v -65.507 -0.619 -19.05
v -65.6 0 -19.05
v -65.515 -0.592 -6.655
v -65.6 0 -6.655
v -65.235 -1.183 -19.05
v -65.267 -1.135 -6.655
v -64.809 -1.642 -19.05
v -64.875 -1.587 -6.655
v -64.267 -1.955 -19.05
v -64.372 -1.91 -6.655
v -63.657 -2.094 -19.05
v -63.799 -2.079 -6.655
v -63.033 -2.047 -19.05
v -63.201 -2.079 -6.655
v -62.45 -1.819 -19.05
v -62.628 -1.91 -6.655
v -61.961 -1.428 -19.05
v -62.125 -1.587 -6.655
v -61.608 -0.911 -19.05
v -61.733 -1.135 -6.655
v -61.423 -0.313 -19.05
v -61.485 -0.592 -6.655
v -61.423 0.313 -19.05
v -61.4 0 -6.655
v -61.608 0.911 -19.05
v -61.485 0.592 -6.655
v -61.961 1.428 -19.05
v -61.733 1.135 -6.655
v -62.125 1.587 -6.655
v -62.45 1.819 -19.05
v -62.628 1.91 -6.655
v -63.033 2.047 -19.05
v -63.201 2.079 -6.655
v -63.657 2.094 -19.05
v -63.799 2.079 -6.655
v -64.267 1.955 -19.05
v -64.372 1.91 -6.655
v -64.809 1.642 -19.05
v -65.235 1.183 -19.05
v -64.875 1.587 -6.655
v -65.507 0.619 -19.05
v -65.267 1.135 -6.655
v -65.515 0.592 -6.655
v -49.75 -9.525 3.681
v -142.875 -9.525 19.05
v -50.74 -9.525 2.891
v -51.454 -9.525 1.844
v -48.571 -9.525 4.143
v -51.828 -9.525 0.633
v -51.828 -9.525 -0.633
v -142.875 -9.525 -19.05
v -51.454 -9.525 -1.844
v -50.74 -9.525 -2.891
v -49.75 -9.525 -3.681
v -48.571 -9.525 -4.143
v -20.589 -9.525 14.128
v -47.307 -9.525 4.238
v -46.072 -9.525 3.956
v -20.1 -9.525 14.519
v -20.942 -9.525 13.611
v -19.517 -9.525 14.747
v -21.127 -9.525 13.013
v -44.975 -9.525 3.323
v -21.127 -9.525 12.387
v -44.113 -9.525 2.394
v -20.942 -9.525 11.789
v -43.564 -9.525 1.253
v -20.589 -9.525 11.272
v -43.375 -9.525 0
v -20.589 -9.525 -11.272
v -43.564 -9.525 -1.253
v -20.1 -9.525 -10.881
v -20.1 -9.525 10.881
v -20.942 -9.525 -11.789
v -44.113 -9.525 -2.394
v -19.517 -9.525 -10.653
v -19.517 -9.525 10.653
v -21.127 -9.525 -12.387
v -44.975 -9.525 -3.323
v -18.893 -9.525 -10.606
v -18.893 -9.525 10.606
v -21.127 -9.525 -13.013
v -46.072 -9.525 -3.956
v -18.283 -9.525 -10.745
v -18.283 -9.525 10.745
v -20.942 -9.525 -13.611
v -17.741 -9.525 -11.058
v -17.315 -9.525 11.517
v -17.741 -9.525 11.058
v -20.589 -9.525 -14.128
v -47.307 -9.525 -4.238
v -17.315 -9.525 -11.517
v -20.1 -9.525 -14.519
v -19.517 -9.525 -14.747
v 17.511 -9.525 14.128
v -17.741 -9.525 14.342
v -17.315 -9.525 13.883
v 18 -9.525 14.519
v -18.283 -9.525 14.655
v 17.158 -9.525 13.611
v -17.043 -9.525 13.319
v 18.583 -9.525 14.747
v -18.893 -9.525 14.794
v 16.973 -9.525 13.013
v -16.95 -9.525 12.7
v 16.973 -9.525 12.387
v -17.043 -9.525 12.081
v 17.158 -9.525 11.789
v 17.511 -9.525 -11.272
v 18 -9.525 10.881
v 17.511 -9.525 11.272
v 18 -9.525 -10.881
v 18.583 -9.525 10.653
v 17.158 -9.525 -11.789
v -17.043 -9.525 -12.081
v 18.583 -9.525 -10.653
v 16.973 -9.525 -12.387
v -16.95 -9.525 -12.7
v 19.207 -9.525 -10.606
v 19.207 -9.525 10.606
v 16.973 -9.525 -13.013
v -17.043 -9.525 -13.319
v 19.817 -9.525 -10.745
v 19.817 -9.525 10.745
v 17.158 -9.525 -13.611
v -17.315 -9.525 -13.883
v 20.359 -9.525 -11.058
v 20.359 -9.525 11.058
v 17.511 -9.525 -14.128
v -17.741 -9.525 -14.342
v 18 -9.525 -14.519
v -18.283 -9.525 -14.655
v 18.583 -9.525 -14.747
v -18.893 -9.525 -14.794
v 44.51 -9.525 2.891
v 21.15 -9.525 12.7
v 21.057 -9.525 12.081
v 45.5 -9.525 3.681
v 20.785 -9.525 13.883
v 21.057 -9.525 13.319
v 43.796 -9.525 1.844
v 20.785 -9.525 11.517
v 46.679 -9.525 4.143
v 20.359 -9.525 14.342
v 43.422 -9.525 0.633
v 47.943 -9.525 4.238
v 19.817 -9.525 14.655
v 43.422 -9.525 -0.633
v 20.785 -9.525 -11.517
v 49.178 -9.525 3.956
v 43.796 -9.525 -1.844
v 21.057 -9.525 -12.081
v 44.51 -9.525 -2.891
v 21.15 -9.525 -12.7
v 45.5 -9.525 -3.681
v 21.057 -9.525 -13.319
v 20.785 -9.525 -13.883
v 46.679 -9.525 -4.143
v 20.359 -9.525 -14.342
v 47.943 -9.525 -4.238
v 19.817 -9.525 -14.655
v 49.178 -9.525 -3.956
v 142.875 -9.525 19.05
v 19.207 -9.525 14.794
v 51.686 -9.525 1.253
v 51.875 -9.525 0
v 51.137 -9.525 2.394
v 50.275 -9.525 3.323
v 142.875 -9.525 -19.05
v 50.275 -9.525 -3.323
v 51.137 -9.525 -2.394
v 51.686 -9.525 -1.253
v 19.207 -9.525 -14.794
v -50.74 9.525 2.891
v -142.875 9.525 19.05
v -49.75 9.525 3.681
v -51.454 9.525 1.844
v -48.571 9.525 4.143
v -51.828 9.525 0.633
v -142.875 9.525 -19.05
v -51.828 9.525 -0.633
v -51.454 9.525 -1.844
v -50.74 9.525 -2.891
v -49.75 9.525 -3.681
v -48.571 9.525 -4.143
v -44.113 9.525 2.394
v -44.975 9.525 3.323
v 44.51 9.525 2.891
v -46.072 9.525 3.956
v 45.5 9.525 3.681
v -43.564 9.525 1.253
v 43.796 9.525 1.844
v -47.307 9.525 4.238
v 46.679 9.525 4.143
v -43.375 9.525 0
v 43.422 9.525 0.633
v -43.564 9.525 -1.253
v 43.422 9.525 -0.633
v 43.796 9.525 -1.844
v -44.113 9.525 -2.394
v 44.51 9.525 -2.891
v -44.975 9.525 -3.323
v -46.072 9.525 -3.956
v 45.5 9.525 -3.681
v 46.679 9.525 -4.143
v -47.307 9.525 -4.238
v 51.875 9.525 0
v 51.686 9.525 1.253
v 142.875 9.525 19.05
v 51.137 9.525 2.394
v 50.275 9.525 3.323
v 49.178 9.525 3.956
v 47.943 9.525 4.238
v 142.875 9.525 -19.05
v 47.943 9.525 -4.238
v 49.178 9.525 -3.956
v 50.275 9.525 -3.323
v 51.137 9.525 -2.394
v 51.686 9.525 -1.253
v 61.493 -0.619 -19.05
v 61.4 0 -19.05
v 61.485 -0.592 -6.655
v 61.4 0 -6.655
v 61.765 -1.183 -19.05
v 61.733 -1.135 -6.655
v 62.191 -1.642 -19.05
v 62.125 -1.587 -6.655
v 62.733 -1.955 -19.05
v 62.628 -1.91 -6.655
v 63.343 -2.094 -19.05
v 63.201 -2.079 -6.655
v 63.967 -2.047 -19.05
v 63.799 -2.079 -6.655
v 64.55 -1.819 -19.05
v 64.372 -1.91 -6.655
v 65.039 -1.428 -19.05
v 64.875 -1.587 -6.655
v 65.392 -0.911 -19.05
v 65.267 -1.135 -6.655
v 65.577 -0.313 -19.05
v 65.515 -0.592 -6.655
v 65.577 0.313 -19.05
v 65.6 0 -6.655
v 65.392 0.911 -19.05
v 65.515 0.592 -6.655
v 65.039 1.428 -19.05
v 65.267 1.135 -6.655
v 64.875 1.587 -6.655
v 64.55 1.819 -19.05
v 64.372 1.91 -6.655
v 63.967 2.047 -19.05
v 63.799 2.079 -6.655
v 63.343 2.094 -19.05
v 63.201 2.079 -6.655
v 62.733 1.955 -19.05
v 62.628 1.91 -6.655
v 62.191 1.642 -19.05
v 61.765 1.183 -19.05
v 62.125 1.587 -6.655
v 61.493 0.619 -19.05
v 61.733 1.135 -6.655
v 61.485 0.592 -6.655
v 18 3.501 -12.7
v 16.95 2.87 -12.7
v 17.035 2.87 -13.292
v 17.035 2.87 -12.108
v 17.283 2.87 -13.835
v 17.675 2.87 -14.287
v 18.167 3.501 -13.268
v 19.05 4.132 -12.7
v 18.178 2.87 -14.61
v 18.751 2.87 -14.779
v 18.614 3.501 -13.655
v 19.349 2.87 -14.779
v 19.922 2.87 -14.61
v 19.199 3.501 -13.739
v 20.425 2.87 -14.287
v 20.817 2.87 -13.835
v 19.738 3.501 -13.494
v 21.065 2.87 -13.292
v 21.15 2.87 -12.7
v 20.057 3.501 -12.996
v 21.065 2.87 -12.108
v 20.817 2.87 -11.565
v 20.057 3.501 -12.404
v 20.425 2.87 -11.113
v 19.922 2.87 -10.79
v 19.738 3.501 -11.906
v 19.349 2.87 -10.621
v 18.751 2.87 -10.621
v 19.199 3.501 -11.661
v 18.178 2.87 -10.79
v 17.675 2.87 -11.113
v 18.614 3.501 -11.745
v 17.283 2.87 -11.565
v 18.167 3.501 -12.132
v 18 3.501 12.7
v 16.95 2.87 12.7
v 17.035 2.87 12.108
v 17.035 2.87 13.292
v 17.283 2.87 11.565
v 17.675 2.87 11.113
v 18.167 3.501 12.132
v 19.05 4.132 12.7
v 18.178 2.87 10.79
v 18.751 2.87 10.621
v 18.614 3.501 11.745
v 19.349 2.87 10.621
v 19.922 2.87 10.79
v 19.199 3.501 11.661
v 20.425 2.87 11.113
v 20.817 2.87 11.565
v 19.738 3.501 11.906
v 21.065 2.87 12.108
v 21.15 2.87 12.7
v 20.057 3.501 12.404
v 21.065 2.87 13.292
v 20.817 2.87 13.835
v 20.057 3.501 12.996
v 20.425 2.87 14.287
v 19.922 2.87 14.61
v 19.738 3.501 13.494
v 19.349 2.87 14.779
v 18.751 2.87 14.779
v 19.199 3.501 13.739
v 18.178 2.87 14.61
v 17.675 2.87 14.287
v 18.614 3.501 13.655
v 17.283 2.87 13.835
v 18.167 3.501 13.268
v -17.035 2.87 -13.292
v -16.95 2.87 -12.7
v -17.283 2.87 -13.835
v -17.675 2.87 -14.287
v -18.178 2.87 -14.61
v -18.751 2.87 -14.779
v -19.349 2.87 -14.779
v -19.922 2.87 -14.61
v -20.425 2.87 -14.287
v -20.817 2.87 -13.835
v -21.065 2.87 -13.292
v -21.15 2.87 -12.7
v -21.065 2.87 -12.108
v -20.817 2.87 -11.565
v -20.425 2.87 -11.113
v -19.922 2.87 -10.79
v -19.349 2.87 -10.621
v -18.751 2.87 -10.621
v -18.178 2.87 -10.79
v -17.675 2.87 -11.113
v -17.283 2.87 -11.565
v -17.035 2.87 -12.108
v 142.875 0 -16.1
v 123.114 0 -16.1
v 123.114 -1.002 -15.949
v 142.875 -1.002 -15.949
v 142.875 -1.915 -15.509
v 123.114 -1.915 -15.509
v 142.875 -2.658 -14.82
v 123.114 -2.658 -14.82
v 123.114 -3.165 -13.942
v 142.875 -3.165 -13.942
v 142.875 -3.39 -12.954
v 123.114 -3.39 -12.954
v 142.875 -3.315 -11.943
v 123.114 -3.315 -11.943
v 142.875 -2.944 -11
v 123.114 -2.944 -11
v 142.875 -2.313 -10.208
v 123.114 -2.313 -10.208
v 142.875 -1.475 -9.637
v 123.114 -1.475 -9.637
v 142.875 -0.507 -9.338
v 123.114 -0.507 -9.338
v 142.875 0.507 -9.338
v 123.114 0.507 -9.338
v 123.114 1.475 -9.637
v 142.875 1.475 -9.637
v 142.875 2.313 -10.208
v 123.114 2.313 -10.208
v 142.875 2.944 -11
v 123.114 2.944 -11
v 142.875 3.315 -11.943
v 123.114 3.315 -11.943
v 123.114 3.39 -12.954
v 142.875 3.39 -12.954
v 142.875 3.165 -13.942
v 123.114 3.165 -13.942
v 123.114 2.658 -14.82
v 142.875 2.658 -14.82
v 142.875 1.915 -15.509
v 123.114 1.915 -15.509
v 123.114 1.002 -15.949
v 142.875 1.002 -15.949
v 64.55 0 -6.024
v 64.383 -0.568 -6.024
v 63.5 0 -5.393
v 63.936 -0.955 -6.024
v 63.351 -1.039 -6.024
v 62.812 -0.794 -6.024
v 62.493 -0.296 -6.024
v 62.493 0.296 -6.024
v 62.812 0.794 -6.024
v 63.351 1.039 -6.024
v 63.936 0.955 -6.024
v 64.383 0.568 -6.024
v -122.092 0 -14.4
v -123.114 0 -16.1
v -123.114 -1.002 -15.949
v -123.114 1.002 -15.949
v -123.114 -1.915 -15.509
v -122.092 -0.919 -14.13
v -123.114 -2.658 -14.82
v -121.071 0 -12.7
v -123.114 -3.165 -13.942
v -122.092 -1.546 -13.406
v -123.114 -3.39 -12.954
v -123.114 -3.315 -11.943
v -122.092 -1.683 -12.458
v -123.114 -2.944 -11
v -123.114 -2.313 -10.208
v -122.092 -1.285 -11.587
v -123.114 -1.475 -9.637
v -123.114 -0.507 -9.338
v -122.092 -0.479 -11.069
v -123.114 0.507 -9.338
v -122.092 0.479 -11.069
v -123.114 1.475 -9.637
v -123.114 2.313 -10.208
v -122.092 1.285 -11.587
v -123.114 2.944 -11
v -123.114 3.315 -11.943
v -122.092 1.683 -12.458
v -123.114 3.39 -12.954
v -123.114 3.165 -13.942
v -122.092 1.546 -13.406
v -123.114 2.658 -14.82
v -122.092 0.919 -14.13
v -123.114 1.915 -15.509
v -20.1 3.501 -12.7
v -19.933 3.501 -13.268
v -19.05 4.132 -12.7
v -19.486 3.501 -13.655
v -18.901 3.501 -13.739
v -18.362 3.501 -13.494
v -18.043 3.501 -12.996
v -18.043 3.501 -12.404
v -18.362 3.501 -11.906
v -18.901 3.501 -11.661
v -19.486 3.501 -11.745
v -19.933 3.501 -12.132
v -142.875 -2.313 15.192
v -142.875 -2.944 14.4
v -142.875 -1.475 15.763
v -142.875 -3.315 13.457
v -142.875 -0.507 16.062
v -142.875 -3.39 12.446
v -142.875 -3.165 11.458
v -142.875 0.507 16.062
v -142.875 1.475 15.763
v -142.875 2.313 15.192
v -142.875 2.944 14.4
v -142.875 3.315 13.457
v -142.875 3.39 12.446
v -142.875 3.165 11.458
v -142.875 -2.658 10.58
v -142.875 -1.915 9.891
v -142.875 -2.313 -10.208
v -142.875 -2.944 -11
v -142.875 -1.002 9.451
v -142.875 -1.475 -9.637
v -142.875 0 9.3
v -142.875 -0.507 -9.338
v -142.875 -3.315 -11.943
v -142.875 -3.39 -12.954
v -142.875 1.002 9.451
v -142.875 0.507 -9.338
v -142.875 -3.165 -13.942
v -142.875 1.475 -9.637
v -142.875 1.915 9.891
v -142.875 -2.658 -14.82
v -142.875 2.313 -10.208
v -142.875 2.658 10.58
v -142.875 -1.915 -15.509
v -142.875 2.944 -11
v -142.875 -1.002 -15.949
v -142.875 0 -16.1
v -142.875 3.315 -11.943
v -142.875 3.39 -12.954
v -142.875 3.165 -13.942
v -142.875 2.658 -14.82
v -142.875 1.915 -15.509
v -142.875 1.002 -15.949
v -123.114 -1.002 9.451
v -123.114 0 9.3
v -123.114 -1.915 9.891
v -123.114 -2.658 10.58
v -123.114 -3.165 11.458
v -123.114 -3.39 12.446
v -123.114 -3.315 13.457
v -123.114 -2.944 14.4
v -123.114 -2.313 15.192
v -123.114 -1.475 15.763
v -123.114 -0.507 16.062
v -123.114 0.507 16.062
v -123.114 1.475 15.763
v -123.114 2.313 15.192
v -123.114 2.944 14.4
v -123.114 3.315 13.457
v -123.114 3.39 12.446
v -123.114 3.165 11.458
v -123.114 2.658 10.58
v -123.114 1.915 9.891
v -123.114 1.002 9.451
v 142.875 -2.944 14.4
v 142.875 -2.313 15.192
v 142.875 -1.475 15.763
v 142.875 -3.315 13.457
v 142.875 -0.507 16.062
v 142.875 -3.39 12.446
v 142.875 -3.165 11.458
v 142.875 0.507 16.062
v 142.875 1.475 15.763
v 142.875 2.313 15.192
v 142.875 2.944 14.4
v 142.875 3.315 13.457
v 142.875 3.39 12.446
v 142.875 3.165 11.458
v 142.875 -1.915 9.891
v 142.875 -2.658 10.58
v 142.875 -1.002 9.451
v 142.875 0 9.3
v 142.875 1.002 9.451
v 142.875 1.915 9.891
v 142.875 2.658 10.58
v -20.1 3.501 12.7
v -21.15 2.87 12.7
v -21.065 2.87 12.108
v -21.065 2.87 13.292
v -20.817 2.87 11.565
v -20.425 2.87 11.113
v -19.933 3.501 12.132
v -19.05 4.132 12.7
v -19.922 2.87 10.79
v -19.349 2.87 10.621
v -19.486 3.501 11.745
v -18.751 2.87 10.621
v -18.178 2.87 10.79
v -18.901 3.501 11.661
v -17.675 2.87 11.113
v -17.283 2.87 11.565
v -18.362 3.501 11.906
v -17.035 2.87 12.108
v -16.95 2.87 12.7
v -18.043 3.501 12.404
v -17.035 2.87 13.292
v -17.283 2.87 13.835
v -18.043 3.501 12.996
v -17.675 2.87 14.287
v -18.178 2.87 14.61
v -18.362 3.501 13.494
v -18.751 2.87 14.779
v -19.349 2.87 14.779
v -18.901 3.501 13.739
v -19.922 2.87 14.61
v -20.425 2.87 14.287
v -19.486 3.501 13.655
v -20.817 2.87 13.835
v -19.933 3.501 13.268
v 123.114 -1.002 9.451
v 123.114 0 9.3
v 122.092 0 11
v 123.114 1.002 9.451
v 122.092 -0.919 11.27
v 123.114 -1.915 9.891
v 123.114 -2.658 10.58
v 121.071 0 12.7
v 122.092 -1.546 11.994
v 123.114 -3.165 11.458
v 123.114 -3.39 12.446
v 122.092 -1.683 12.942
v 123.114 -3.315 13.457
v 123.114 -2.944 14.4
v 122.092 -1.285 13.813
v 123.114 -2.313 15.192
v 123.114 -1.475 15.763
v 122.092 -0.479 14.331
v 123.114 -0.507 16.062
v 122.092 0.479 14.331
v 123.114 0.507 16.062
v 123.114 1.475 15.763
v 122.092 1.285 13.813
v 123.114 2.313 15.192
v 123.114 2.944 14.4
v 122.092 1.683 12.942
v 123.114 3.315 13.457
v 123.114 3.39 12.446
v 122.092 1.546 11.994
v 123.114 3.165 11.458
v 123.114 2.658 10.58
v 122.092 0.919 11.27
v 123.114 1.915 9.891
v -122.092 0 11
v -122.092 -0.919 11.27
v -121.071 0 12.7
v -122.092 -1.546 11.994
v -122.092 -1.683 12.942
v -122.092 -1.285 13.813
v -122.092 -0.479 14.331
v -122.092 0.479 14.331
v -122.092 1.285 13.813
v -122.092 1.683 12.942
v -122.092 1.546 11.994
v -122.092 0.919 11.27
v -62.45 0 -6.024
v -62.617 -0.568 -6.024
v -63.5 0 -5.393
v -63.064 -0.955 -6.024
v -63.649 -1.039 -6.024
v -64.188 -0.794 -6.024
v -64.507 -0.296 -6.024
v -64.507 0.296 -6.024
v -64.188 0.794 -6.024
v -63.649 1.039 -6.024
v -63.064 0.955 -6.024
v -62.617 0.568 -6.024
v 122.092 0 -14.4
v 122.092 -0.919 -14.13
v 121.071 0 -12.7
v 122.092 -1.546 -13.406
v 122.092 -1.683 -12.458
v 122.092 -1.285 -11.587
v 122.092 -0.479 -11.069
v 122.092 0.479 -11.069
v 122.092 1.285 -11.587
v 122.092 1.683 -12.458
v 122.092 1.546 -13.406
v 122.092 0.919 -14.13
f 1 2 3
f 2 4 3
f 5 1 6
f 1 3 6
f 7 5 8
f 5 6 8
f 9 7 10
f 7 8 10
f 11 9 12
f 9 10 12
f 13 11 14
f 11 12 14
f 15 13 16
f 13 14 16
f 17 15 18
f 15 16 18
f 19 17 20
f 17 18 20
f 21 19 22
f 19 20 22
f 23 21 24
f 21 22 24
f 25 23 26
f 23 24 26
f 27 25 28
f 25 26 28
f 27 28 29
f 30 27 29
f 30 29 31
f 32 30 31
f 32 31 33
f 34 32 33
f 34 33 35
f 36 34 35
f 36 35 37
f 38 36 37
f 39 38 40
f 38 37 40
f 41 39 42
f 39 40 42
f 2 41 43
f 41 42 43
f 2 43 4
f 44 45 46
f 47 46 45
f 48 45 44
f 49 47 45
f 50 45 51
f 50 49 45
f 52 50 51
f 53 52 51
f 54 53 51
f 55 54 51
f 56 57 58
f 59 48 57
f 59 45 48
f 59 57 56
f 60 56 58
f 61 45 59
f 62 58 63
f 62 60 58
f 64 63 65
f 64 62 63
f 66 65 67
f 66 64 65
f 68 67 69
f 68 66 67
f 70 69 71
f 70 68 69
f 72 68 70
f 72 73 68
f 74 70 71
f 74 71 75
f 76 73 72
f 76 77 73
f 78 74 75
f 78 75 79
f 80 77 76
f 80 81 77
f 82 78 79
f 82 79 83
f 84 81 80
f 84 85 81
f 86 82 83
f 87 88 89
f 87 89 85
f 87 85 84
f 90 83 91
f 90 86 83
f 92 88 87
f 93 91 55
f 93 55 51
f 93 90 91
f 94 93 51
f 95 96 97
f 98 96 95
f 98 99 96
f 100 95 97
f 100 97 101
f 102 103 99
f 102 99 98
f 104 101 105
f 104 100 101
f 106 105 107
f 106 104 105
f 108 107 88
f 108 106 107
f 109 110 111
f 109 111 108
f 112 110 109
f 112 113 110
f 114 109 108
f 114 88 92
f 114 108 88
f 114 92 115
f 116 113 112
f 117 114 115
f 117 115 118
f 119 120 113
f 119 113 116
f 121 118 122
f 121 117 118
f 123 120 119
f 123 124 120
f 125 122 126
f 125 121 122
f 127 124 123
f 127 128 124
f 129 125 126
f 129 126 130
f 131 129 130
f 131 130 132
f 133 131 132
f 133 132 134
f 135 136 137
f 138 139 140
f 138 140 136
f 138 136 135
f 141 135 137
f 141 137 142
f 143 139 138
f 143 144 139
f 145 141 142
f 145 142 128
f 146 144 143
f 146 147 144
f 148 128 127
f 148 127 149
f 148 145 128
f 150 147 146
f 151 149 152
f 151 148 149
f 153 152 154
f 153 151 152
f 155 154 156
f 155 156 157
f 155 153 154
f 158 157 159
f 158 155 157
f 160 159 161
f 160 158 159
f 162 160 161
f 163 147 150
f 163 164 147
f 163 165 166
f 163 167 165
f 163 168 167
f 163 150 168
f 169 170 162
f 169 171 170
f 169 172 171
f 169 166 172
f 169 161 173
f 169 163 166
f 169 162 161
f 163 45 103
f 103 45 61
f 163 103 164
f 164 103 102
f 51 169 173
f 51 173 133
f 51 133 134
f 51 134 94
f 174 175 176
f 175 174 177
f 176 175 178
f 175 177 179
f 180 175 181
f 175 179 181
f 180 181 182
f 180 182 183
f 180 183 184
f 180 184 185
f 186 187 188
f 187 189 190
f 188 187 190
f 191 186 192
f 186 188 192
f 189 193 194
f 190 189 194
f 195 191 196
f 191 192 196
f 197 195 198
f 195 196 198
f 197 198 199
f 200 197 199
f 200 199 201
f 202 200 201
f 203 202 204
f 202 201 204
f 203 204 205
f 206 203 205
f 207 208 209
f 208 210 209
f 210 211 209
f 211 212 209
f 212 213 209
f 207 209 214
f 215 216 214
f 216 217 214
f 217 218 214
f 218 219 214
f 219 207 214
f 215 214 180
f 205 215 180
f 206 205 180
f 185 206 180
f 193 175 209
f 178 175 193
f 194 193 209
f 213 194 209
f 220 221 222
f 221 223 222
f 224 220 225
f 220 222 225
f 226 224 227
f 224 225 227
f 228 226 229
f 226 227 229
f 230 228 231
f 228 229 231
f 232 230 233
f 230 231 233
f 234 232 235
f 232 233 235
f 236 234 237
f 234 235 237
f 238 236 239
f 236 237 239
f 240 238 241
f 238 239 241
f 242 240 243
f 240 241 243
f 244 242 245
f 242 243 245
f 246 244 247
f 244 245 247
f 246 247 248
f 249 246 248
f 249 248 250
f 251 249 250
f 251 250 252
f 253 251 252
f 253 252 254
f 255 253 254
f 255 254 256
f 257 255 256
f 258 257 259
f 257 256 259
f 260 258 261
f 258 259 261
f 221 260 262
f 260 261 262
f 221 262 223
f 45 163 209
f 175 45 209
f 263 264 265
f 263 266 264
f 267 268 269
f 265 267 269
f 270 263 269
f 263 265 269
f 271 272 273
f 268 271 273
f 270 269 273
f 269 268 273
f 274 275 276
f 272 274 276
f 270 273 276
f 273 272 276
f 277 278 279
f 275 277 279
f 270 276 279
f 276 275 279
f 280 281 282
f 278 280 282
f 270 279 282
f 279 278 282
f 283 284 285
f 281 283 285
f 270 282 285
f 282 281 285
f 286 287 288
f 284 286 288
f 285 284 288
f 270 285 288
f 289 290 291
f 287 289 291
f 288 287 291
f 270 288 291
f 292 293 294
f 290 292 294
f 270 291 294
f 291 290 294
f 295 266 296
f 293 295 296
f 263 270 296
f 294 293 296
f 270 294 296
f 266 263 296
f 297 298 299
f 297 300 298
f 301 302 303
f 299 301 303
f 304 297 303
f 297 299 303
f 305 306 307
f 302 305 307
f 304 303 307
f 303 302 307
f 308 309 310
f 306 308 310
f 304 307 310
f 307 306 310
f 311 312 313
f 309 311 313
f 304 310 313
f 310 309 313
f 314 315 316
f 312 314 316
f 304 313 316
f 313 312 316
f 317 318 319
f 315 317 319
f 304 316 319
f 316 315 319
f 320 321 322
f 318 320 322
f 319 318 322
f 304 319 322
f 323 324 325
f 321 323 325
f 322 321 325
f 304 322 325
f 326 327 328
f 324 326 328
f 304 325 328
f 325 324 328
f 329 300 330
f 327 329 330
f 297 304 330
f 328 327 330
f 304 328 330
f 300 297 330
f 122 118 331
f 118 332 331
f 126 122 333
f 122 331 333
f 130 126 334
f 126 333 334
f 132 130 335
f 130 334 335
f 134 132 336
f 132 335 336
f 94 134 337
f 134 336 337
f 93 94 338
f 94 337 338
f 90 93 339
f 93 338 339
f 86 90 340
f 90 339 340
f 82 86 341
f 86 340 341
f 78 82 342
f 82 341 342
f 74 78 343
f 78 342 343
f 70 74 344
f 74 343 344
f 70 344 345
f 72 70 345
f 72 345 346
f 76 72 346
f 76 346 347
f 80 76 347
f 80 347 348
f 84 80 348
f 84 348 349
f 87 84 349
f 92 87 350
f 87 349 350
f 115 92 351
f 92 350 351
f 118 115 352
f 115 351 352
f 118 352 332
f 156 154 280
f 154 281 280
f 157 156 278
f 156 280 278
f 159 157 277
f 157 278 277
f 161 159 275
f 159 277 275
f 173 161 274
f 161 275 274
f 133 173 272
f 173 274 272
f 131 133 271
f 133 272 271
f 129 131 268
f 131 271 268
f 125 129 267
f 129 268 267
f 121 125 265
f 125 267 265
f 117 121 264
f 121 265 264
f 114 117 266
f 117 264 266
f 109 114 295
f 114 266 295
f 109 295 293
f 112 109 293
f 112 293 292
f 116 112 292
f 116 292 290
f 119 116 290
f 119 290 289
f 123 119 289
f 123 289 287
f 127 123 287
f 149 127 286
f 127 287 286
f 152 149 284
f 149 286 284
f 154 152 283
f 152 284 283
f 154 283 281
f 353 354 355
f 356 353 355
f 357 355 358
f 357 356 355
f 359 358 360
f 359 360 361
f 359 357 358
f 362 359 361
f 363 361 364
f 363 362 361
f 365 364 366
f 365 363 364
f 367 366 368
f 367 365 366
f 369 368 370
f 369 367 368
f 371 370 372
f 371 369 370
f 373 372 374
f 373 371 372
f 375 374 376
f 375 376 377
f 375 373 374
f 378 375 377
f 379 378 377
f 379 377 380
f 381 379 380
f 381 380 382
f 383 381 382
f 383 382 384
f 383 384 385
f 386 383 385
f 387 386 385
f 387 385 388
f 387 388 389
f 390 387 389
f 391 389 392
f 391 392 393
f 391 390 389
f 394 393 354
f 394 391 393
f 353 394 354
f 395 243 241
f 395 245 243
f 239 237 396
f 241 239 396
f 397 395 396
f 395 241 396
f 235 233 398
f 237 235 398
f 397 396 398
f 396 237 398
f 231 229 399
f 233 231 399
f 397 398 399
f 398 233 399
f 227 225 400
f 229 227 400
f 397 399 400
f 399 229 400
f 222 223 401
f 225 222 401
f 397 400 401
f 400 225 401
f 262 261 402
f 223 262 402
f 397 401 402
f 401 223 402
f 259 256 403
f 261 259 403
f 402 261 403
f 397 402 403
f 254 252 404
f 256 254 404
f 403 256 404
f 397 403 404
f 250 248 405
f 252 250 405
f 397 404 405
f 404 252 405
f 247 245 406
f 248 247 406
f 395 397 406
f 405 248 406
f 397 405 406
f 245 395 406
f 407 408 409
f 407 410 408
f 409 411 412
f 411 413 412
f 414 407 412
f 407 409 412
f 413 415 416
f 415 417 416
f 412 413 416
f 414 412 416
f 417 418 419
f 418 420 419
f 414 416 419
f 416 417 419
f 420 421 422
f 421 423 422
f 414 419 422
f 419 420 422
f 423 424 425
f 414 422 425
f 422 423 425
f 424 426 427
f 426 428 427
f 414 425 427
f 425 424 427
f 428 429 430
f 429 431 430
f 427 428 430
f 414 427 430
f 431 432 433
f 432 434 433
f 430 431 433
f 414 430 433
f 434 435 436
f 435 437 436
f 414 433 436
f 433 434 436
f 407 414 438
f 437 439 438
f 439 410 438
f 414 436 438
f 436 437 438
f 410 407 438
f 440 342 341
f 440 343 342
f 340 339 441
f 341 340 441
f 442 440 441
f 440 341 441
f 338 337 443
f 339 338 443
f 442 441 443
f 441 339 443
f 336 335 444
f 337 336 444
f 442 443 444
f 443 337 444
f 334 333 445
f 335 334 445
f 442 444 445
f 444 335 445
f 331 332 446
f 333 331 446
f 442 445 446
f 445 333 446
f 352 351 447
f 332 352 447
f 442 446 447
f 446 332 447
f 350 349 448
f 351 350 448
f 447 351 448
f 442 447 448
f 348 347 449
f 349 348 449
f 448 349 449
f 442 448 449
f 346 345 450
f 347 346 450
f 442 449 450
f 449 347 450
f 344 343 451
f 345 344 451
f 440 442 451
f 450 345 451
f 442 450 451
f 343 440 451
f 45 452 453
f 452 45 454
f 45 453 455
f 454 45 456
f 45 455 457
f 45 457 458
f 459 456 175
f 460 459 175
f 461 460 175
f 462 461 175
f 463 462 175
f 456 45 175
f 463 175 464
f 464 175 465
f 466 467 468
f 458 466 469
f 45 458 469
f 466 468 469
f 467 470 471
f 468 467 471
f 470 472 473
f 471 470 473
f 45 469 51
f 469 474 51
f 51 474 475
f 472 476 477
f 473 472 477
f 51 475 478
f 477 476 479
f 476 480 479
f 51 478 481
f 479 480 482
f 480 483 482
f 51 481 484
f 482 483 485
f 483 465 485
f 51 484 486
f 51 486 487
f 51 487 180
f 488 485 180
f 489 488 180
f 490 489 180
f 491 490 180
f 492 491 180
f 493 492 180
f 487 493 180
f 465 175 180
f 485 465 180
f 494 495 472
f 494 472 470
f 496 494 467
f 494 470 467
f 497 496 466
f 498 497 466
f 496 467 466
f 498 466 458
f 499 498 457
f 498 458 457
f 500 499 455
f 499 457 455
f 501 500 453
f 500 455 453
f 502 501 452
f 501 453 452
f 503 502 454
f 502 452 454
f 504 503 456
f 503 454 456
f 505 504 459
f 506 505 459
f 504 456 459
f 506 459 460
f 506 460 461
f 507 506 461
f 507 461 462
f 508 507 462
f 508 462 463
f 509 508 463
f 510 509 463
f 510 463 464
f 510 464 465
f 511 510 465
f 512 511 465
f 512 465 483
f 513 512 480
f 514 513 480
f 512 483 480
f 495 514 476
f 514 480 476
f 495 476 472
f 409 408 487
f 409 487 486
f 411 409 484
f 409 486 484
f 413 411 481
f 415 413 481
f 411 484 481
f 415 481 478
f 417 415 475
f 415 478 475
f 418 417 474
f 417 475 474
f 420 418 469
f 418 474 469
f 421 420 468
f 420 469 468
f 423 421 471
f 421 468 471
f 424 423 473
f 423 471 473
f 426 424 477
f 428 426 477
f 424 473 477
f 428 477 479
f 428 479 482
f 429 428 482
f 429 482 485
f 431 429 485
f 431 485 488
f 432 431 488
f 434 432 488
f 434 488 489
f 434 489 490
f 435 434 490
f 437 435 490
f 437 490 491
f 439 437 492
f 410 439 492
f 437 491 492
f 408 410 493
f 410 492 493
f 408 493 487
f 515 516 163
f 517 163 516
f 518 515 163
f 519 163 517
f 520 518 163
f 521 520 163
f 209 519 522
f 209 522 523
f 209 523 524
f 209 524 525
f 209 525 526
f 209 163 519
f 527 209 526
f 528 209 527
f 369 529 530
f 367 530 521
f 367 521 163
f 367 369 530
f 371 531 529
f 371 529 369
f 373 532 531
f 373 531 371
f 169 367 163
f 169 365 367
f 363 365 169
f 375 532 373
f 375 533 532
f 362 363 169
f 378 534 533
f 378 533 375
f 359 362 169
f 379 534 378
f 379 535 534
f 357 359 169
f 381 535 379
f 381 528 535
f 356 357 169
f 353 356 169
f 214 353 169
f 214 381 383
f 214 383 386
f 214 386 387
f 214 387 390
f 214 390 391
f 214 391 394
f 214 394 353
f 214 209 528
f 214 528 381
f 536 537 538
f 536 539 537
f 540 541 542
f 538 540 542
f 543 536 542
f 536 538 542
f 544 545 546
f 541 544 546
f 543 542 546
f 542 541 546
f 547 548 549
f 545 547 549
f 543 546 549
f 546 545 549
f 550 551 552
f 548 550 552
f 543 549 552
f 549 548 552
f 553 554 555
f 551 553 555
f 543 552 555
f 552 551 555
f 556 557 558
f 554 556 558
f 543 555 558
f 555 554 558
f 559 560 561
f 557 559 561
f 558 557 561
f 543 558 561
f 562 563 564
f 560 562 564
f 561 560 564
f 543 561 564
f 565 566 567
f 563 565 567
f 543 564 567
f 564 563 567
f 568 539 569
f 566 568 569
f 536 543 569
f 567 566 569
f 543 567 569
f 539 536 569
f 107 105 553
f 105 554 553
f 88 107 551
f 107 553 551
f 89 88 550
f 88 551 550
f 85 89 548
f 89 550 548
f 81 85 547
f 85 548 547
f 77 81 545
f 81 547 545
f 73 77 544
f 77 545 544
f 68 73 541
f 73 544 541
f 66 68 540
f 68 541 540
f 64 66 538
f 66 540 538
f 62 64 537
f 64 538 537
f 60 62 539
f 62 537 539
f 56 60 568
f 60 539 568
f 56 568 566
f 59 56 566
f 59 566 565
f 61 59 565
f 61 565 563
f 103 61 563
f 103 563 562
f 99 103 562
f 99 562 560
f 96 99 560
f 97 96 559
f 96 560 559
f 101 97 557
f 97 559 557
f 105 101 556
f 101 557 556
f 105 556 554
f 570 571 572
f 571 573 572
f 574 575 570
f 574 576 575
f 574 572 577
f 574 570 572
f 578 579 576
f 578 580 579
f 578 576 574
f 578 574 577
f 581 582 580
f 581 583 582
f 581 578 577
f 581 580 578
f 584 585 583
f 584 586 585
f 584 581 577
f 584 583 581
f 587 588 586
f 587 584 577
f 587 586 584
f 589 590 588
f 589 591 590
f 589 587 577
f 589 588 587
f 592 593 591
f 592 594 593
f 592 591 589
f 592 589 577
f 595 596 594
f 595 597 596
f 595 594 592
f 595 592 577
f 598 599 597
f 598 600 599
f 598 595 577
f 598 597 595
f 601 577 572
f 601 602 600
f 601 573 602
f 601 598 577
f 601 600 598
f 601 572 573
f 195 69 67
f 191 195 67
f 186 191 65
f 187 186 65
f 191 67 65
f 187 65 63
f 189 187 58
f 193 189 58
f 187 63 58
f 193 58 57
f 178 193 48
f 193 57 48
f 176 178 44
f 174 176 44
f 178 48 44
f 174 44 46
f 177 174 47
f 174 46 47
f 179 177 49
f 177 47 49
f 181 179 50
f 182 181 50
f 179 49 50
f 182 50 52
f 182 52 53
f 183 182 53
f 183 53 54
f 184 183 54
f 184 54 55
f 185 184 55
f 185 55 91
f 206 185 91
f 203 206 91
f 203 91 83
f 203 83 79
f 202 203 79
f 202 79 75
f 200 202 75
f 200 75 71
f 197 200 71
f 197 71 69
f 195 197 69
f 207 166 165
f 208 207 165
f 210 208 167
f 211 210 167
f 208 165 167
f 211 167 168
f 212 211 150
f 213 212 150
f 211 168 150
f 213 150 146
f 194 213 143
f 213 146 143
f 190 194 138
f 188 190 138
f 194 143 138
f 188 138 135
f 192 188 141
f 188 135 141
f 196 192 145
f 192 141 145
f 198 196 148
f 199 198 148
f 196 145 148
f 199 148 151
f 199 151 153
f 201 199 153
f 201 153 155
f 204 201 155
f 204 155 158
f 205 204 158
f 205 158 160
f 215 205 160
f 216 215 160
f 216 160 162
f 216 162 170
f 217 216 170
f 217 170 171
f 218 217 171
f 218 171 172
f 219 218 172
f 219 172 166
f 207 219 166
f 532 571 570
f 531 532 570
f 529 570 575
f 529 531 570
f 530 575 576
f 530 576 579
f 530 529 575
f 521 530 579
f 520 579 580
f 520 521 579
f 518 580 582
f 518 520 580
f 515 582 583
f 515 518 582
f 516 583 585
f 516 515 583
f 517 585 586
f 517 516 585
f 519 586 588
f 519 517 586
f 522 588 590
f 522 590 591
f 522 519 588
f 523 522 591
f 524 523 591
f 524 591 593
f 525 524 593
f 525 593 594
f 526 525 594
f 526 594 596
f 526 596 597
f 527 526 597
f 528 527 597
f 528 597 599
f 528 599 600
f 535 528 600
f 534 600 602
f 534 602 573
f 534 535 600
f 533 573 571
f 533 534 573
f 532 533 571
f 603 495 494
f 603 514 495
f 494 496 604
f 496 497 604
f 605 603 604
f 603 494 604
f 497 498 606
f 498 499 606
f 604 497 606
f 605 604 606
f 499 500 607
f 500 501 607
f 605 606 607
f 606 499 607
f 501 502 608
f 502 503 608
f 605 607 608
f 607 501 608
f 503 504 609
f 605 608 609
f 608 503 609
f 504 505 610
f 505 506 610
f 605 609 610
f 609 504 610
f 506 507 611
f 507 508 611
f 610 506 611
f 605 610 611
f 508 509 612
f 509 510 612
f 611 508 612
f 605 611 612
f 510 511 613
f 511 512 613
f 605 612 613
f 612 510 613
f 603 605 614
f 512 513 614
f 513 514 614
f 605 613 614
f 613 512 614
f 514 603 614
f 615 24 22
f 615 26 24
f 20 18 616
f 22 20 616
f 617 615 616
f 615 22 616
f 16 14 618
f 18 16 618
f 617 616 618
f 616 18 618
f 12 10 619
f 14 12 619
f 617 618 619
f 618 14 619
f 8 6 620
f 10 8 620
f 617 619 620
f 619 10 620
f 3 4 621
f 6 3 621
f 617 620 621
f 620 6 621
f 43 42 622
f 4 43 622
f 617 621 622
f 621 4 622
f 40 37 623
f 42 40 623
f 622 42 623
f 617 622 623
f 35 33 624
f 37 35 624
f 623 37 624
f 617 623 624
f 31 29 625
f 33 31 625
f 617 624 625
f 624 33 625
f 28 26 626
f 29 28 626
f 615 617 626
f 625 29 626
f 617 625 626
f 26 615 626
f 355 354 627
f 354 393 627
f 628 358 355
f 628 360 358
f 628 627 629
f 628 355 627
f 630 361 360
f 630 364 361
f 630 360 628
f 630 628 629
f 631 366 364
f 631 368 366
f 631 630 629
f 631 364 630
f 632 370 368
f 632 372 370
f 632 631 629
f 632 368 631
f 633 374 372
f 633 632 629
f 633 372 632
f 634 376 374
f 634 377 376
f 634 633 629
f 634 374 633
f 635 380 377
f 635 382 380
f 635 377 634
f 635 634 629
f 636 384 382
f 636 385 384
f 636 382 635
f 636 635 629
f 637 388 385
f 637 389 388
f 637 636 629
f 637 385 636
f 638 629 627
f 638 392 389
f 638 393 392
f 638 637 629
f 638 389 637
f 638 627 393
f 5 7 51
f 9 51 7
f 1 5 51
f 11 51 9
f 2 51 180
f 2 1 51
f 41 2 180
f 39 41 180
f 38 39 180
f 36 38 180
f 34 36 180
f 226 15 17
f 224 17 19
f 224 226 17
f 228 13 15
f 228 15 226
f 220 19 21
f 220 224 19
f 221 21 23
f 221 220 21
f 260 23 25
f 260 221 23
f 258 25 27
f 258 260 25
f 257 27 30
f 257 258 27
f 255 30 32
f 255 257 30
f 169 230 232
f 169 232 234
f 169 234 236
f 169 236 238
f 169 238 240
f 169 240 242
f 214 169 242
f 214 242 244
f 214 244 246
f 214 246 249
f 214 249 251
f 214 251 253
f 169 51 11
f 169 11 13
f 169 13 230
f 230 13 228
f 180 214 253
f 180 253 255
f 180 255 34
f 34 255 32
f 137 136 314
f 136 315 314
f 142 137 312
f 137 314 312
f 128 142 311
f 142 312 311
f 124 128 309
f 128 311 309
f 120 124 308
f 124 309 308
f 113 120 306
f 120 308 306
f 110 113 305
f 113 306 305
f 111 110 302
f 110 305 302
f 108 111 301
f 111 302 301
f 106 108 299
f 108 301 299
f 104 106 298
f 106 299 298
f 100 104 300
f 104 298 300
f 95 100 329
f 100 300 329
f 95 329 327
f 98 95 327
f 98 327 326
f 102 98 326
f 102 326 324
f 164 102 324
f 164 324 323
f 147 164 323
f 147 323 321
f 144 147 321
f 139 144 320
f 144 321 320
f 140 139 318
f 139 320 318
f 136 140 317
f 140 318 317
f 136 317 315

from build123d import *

# Parameters (mm, degrees)
SKETCH1_W                       = 38.1
SKETCH1_H                       = 19.05
EXTRUDE1_DEPTH                  = 142.875
M8X1_25_TAPPED_HOLE1_AT_2_COUNT = 2
M8X1_25_TAPPED_HOLE1_AT_2_PITCH = 25.4
M10X1_5_TAPPED_HOLE1_D          = 8.5
M5X0_8_TAPPED_HOLE2_D           = 4.2
M5X0_8_TAPPED_HOLE2_DEPTH       = 12.3952
M5X0_8_TAPPED_HOLE2_TIP         = 1.2618073
M5X0_8_TAPPED_HOLE3_D           = 4.2
M5X0_8_TAPPED_HOLE3_DEPTH       = 12.3952
M5X0_8_TAPPED_HOLE3_TIP         = 1.2618073


with BuildPart() as part:
    # Sketch1 → Extrude1 (new, symmetric)
    with BuildSketch(Plane(origin=(0, 0, 0), x_dir=(0, 0, -1), z_dir=(1, 0, 0))):
        Rectangle(SKETCH1_W, SKETCH1_H)
    extrude(amount=EXTRUDE1_DEPTH, both=True)

    # Sketch2 → M8x1.25 Tapped Hole1 (revolve, cut)
    with BuildSketch(Plane(origin=(142.875, 0, 12.7), x_dir=(0, 0, -1), z_dir=(0, 1, 0))):
        Polygon((0, 0), (0, 21.804126105), (3.4, 19.7612), (3.4, 0), align=None)
    m8x1_25_tapped_hole1 = revolve(axis=Axis((149.225, 0, 12.7), (-1, 0, 0)), mode=Mode.SUBTRACT)

    # M8x1.25 Tapped Hole1 at 2: M8x1.25 Tapped Hole1 ×2
    with Locations(*[(0, 0, -i * M8X1_25_TAPPED_HOLE1_AT_2_PITCH) for i in range(1, M8X1_25_TAPPED_HOLE1_AT_2_COUNT)]):
        add(m8x1_25_tapped_hole1, mode=Mode.SUBTRACT)

    # Mirror1: M8x1.25 Tapped Hole1 across plane
    add(m8x1_25_tapped_hole1.mirror(Plane(origin=(0, 0, 0), x_dir=(0, 0, 1), z_dir=(1, 0, 0))), mode=Mode.SUBTRACT)

    # Mirror1 copy 1 sketch → Mirror1 copy 1 (revolve, cut)
    with BuildSketch(Plane(origin=(-142.875, 0, -12.7), x_dir=(0, 0, -1), z_dir=(0, 1, 0))):
        Polygon((0, 0), (0, -21.804126105), (3.4, -19.7612), (3.4, 0), align=None)
    revolve(axis=Axis((-149.225, 0, -12.7), (-1, 0, 0)), mode=Mode.SUBTRACT)

    # M10x1.5 Tapped Hole1 (through all)
    with Locations(Plane(origin=(0, 9.525, 0), x_dir=(-1, 0, 0), z_dir=(0, 1, 0))):
        with Locations((47.625, 0), (-47.625, 0)):
            Hole(M10X1_5_TAPPED_HOLE1_D / 2)

    # M5x0.8 Tapped Hole2
    with Locations(Plane(origin=(-9.051259955, 7.173736758, -19.05), x_dir=(1, 0, 0), z_dir=(0, 0, -1))):
        with Locations((72.551259955, 7.173736758), (-54.448740045, 7.173736758)):
            Hole(M5X0_8_TAPPED_HOLE2_D / 2, depth=M5X0_8_TAPPED_HOLE2_DEPTH)
            with Locations((0, 0, -(M5X0_8_TAPPED_HOLE2_DEPTH + M5X0_8_TAPPED_HOLE2_TIP / 2))):  # 118° drill point
                Cone(0, M5X0_8_TAPPED_HOLE2_D / 2, M5X0_8_TAPPED_HOLE2_TIP, mode=Mode.SUBTRACT)

    # M5x0.8 Tapped Hole3
    with Locations(Plane(origin=(0, -9.525, 0), x_dir=(-1, 0, 0), z_dir=(0, -1, 0))):
        with Locations((-19.05, 12.7), (19.05, 12.7), (19.05, -12.7), (-19.05, -12.7)):
            Hole(M5X0_8_TAPPED_HOLE3_D / 2, depth=M5X0_8_TAPPED_HOLE3_DEPTH)
            with Locations((0, 0, -(M5X0_8_TAPPED_HOLE3_DEPTH + M5X0_8_TAPPED_HOLE3_TIP / 2))):  # 118° drill point
                Cone(0, M5X0_8_TAPPED_HOLE3_D / 2, M5X0_8_TAPPED_HOLE3_TIP, mode=Mode.SUBTRACT)


solid = part.part
